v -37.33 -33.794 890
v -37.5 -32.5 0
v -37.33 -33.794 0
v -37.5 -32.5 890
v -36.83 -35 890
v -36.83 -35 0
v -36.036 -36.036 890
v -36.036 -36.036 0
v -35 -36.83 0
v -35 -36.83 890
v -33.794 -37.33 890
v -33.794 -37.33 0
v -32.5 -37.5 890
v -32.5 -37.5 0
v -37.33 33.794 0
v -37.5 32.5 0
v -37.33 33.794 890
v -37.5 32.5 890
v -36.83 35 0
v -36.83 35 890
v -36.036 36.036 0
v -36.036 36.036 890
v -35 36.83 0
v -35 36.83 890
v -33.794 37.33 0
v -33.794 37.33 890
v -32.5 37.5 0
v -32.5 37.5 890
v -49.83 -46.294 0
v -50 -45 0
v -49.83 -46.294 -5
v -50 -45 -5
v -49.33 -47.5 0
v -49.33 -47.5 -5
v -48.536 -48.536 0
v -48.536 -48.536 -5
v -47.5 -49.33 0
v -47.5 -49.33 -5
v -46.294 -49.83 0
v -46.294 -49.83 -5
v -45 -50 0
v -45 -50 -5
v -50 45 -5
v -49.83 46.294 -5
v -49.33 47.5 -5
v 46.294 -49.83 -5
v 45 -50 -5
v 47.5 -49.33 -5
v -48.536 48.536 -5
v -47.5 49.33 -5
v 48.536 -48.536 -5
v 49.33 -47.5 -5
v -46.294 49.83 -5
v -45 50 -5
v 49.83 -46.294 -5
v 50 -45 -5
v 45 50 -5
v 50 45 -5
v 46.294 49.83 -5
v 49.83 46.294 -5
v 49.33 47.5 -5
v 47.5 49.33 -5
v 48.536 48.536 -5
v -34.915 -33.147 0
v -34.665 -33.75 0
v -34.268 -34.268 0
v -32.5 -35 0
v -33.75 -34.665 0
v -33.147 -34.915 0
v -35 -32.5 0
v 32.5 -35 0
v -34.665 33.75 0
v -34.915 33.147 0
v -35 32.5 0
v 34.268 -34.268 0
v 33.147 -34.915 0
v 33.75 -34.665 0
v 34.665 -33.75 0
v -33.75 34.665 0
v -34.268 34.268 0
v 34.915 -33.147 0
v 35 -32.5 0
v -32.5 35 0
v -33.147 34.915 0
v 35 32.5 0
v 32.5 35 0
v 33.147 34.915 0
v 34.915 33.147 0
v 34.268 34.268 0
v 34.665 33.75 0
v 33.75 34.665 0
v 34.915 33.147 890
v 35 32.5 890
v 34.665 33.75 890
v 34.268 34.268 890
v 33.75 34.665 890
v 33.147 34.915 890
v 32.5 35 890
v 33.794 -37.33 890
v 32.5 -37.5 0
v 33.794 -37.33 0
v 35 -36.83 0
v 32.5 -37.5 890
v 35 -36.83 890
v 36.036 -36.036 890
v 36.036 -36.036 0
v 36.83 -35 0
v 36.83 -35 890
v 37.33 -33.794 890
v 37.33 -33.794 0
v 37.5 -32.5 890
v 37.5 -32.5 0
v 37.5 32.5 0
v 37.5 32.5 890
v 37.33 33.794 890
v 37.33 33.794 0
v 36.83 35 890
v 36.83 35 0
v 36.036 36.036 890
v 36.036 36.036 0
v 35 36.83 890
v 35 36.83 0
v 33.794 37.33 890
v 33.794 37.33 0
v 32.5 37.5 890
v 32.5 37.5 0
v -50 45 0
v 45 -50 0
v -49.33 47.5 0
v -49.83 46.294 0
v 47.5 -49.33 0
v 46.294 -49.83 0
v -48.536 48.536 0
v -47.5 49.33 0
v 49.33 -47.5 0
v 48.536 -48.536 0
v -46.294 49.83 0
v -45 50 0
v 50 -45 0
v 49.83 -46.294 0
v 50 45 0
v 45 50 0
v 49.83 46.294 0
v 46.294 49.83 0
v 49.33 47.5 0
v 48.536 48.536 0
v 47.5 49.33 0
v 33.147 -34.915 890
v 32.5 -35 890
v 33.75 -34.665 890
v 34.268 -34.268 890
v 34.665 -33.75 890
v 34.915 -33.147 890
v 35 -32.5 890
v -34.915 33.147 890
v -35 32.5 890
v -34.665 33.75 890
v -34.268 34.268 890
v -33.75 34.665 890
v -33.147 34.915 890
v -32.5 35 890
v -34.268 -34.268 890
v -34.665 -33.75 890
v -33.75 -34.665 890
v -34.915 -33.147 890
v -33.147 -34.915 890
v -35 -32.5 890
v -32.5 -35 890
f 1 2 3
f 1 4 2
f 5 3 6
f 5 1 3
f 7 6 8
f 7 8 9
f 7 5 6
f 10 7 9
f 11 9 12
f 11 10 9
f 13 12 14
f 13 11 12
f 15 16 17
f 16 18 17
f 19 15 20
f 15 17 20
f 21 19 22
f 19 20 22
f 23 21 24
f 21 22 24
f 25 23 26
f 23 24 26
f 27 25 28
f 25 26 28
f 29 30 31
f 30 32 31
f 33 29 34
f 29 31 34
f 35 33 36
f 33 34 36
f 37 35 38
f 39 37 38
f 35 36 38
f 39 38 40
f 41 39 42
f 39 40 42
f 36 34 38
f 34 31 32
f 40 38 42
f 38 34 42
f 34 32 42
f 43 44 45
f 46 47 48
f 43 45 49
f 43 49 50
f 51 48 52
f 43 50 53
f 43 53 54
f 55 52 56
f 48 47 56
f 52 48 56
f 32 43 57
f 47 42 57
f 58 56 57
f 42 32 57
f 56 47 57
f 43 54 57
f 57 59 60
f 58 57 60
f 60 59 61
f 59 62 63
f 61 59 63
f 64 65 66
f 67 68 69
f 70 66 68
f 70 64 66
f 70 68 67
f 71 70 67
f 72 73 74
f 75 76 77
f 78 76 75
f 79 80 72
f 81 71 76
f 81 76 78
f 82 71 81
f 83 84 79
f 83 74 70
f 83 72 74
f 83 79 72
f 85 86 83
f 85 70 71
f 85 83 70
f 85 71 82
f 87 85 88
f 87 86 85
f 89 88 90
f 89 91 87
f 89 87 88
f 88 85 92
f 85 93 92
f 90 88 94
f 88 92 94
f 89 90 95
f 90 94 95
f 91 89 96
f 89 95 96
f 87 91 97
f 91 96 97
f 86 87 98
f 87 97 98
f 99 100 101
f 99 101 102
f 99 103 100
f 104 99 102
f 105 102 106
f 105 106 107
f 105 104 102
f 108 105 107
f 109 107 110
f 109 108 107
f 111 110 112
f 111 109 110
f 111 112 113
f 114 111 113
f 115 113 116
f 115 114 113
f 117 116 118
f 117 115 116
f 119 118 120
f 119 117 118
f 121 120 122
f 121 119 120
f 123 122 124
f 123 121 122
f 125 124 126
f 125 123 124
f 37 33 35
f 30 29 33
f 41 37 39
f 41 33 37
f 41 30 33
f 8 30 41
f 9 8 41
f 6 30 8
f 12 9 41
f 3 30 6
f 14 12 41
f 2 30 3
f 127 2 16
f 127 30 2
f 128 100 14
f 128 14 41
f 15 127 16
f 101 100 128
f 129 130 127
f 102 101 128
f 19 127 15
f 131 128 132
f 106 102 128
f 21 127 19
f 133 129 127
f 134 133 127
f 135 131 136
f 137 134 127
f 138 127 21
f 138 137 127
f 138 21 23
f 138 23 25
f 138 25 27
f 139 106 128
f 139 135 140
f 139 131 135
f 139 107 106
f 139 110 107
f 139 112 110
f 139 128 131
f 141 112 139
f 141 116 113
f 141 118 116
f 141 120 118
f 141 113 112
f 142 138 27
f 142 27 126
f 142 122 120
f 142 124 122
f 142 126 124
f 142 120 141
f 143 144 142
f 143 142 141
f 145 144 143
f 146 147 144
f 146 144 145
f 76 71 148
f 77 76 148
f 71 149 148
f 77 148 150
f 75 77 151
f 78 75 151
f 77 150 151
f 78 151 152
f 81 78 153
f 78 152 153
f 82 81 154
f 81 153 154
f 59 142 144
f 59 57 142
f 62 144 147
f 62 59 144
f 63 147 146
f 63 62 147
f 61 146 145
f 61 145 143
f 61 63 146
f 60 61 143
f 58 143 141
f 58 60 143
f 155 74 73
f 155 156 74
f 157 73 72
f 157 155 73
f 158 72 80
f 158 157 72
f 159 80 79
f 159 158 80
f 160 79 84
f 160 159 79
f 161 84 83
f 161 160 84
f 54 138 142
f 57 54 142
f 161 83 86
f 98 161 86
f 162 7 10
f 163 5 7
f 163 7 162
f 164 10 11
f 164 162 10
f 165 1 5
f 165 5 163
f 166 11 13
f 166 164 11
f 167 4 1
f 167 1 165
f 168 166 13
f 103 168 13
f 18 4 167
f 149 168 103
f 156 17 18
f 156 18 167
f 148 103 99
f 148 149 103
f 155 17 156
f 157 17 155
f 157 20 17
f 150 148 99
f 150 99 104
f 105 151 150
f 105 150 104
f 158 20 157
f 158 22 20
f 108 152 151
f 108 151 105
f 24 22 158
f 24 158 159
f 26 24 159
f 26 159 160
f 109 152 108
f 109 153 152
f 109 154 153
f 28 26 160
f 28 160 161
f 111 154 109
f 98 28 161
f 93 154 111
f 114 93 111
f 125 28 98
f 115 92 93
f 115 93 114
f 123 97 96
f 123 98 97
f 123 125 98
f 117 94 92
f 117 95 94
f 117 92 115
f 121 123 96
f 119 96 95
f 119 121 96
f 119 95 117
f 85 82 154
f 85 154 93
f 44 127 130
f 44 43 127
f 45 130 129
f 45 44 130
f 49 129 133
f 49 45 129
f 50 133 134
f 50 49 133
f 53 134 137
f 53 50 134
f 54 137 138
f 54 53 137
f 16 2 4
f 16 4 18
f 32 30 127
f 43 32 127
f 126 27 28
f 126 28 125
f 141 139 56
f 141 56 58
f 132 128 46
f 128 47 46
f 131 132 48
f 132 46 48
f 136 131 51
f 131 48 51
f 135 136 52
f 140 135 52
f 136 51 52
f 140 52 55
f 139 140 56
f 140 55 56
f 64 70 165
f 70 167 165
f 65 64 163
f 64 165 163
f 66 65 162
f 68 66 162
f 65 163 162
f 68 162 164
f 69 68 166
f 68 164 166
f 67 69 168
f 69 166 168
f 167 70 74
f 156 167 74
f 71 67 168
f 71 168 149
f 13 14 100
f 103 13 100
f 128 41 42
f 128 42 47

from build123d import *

# Parameters (mm, degrees)
F0_W     = 75
F0_H     = 75
F1_DEPTH = 890
F2_R     = 5
F3_T     = -2.5
F4_W     = 100
F4_H     = 100
F5_DEPTH = 5
F6_R     = 5


with BuildPart() as f1:
    # F0 (on Top) → F1 (new body)
    with BuildSketch(Plane.XY):
        Rectangle(F0_W, F0_H)
    extrude(amount=F1_DEPTH)

    # F2
    f2_edges = [f1.edges().sort_by_distance(p)[0] for p in [
        (-37.5, -37.5, 445),
        (-37.5, 37.5, 445),
        (37.5, -37.5, 445),
        (37.5, 37.5, 445),
    ]]
    fillet(f2_edges, radius=F2_R)

    # F3
    f3_openings = [f1.faces().sort_by_distance(p)[0] for p in [
        (0, 0, 0),
        (0, 0, 890),
    ]]
    offset(amount=F3_T, openings=f3_openings)

    # F4 (on Top) → F5 (join)
    with BuildSketch(Plane.XY):
        Rectangle(F4_W, F4_H)
    extrude(amount=-F5_DEPTH)

    # F6
    f6_edges = [f1.edges().sort_by_distance(p)[0] for p in [
        (50, -50, -2.5),
        (50, 50, -2.5),
        (-50, -50, -2.5),
        (-50, 50, -2.5),
    ]]
    fillet(f6_edges, radius=F6_R)


solid = f1.part
